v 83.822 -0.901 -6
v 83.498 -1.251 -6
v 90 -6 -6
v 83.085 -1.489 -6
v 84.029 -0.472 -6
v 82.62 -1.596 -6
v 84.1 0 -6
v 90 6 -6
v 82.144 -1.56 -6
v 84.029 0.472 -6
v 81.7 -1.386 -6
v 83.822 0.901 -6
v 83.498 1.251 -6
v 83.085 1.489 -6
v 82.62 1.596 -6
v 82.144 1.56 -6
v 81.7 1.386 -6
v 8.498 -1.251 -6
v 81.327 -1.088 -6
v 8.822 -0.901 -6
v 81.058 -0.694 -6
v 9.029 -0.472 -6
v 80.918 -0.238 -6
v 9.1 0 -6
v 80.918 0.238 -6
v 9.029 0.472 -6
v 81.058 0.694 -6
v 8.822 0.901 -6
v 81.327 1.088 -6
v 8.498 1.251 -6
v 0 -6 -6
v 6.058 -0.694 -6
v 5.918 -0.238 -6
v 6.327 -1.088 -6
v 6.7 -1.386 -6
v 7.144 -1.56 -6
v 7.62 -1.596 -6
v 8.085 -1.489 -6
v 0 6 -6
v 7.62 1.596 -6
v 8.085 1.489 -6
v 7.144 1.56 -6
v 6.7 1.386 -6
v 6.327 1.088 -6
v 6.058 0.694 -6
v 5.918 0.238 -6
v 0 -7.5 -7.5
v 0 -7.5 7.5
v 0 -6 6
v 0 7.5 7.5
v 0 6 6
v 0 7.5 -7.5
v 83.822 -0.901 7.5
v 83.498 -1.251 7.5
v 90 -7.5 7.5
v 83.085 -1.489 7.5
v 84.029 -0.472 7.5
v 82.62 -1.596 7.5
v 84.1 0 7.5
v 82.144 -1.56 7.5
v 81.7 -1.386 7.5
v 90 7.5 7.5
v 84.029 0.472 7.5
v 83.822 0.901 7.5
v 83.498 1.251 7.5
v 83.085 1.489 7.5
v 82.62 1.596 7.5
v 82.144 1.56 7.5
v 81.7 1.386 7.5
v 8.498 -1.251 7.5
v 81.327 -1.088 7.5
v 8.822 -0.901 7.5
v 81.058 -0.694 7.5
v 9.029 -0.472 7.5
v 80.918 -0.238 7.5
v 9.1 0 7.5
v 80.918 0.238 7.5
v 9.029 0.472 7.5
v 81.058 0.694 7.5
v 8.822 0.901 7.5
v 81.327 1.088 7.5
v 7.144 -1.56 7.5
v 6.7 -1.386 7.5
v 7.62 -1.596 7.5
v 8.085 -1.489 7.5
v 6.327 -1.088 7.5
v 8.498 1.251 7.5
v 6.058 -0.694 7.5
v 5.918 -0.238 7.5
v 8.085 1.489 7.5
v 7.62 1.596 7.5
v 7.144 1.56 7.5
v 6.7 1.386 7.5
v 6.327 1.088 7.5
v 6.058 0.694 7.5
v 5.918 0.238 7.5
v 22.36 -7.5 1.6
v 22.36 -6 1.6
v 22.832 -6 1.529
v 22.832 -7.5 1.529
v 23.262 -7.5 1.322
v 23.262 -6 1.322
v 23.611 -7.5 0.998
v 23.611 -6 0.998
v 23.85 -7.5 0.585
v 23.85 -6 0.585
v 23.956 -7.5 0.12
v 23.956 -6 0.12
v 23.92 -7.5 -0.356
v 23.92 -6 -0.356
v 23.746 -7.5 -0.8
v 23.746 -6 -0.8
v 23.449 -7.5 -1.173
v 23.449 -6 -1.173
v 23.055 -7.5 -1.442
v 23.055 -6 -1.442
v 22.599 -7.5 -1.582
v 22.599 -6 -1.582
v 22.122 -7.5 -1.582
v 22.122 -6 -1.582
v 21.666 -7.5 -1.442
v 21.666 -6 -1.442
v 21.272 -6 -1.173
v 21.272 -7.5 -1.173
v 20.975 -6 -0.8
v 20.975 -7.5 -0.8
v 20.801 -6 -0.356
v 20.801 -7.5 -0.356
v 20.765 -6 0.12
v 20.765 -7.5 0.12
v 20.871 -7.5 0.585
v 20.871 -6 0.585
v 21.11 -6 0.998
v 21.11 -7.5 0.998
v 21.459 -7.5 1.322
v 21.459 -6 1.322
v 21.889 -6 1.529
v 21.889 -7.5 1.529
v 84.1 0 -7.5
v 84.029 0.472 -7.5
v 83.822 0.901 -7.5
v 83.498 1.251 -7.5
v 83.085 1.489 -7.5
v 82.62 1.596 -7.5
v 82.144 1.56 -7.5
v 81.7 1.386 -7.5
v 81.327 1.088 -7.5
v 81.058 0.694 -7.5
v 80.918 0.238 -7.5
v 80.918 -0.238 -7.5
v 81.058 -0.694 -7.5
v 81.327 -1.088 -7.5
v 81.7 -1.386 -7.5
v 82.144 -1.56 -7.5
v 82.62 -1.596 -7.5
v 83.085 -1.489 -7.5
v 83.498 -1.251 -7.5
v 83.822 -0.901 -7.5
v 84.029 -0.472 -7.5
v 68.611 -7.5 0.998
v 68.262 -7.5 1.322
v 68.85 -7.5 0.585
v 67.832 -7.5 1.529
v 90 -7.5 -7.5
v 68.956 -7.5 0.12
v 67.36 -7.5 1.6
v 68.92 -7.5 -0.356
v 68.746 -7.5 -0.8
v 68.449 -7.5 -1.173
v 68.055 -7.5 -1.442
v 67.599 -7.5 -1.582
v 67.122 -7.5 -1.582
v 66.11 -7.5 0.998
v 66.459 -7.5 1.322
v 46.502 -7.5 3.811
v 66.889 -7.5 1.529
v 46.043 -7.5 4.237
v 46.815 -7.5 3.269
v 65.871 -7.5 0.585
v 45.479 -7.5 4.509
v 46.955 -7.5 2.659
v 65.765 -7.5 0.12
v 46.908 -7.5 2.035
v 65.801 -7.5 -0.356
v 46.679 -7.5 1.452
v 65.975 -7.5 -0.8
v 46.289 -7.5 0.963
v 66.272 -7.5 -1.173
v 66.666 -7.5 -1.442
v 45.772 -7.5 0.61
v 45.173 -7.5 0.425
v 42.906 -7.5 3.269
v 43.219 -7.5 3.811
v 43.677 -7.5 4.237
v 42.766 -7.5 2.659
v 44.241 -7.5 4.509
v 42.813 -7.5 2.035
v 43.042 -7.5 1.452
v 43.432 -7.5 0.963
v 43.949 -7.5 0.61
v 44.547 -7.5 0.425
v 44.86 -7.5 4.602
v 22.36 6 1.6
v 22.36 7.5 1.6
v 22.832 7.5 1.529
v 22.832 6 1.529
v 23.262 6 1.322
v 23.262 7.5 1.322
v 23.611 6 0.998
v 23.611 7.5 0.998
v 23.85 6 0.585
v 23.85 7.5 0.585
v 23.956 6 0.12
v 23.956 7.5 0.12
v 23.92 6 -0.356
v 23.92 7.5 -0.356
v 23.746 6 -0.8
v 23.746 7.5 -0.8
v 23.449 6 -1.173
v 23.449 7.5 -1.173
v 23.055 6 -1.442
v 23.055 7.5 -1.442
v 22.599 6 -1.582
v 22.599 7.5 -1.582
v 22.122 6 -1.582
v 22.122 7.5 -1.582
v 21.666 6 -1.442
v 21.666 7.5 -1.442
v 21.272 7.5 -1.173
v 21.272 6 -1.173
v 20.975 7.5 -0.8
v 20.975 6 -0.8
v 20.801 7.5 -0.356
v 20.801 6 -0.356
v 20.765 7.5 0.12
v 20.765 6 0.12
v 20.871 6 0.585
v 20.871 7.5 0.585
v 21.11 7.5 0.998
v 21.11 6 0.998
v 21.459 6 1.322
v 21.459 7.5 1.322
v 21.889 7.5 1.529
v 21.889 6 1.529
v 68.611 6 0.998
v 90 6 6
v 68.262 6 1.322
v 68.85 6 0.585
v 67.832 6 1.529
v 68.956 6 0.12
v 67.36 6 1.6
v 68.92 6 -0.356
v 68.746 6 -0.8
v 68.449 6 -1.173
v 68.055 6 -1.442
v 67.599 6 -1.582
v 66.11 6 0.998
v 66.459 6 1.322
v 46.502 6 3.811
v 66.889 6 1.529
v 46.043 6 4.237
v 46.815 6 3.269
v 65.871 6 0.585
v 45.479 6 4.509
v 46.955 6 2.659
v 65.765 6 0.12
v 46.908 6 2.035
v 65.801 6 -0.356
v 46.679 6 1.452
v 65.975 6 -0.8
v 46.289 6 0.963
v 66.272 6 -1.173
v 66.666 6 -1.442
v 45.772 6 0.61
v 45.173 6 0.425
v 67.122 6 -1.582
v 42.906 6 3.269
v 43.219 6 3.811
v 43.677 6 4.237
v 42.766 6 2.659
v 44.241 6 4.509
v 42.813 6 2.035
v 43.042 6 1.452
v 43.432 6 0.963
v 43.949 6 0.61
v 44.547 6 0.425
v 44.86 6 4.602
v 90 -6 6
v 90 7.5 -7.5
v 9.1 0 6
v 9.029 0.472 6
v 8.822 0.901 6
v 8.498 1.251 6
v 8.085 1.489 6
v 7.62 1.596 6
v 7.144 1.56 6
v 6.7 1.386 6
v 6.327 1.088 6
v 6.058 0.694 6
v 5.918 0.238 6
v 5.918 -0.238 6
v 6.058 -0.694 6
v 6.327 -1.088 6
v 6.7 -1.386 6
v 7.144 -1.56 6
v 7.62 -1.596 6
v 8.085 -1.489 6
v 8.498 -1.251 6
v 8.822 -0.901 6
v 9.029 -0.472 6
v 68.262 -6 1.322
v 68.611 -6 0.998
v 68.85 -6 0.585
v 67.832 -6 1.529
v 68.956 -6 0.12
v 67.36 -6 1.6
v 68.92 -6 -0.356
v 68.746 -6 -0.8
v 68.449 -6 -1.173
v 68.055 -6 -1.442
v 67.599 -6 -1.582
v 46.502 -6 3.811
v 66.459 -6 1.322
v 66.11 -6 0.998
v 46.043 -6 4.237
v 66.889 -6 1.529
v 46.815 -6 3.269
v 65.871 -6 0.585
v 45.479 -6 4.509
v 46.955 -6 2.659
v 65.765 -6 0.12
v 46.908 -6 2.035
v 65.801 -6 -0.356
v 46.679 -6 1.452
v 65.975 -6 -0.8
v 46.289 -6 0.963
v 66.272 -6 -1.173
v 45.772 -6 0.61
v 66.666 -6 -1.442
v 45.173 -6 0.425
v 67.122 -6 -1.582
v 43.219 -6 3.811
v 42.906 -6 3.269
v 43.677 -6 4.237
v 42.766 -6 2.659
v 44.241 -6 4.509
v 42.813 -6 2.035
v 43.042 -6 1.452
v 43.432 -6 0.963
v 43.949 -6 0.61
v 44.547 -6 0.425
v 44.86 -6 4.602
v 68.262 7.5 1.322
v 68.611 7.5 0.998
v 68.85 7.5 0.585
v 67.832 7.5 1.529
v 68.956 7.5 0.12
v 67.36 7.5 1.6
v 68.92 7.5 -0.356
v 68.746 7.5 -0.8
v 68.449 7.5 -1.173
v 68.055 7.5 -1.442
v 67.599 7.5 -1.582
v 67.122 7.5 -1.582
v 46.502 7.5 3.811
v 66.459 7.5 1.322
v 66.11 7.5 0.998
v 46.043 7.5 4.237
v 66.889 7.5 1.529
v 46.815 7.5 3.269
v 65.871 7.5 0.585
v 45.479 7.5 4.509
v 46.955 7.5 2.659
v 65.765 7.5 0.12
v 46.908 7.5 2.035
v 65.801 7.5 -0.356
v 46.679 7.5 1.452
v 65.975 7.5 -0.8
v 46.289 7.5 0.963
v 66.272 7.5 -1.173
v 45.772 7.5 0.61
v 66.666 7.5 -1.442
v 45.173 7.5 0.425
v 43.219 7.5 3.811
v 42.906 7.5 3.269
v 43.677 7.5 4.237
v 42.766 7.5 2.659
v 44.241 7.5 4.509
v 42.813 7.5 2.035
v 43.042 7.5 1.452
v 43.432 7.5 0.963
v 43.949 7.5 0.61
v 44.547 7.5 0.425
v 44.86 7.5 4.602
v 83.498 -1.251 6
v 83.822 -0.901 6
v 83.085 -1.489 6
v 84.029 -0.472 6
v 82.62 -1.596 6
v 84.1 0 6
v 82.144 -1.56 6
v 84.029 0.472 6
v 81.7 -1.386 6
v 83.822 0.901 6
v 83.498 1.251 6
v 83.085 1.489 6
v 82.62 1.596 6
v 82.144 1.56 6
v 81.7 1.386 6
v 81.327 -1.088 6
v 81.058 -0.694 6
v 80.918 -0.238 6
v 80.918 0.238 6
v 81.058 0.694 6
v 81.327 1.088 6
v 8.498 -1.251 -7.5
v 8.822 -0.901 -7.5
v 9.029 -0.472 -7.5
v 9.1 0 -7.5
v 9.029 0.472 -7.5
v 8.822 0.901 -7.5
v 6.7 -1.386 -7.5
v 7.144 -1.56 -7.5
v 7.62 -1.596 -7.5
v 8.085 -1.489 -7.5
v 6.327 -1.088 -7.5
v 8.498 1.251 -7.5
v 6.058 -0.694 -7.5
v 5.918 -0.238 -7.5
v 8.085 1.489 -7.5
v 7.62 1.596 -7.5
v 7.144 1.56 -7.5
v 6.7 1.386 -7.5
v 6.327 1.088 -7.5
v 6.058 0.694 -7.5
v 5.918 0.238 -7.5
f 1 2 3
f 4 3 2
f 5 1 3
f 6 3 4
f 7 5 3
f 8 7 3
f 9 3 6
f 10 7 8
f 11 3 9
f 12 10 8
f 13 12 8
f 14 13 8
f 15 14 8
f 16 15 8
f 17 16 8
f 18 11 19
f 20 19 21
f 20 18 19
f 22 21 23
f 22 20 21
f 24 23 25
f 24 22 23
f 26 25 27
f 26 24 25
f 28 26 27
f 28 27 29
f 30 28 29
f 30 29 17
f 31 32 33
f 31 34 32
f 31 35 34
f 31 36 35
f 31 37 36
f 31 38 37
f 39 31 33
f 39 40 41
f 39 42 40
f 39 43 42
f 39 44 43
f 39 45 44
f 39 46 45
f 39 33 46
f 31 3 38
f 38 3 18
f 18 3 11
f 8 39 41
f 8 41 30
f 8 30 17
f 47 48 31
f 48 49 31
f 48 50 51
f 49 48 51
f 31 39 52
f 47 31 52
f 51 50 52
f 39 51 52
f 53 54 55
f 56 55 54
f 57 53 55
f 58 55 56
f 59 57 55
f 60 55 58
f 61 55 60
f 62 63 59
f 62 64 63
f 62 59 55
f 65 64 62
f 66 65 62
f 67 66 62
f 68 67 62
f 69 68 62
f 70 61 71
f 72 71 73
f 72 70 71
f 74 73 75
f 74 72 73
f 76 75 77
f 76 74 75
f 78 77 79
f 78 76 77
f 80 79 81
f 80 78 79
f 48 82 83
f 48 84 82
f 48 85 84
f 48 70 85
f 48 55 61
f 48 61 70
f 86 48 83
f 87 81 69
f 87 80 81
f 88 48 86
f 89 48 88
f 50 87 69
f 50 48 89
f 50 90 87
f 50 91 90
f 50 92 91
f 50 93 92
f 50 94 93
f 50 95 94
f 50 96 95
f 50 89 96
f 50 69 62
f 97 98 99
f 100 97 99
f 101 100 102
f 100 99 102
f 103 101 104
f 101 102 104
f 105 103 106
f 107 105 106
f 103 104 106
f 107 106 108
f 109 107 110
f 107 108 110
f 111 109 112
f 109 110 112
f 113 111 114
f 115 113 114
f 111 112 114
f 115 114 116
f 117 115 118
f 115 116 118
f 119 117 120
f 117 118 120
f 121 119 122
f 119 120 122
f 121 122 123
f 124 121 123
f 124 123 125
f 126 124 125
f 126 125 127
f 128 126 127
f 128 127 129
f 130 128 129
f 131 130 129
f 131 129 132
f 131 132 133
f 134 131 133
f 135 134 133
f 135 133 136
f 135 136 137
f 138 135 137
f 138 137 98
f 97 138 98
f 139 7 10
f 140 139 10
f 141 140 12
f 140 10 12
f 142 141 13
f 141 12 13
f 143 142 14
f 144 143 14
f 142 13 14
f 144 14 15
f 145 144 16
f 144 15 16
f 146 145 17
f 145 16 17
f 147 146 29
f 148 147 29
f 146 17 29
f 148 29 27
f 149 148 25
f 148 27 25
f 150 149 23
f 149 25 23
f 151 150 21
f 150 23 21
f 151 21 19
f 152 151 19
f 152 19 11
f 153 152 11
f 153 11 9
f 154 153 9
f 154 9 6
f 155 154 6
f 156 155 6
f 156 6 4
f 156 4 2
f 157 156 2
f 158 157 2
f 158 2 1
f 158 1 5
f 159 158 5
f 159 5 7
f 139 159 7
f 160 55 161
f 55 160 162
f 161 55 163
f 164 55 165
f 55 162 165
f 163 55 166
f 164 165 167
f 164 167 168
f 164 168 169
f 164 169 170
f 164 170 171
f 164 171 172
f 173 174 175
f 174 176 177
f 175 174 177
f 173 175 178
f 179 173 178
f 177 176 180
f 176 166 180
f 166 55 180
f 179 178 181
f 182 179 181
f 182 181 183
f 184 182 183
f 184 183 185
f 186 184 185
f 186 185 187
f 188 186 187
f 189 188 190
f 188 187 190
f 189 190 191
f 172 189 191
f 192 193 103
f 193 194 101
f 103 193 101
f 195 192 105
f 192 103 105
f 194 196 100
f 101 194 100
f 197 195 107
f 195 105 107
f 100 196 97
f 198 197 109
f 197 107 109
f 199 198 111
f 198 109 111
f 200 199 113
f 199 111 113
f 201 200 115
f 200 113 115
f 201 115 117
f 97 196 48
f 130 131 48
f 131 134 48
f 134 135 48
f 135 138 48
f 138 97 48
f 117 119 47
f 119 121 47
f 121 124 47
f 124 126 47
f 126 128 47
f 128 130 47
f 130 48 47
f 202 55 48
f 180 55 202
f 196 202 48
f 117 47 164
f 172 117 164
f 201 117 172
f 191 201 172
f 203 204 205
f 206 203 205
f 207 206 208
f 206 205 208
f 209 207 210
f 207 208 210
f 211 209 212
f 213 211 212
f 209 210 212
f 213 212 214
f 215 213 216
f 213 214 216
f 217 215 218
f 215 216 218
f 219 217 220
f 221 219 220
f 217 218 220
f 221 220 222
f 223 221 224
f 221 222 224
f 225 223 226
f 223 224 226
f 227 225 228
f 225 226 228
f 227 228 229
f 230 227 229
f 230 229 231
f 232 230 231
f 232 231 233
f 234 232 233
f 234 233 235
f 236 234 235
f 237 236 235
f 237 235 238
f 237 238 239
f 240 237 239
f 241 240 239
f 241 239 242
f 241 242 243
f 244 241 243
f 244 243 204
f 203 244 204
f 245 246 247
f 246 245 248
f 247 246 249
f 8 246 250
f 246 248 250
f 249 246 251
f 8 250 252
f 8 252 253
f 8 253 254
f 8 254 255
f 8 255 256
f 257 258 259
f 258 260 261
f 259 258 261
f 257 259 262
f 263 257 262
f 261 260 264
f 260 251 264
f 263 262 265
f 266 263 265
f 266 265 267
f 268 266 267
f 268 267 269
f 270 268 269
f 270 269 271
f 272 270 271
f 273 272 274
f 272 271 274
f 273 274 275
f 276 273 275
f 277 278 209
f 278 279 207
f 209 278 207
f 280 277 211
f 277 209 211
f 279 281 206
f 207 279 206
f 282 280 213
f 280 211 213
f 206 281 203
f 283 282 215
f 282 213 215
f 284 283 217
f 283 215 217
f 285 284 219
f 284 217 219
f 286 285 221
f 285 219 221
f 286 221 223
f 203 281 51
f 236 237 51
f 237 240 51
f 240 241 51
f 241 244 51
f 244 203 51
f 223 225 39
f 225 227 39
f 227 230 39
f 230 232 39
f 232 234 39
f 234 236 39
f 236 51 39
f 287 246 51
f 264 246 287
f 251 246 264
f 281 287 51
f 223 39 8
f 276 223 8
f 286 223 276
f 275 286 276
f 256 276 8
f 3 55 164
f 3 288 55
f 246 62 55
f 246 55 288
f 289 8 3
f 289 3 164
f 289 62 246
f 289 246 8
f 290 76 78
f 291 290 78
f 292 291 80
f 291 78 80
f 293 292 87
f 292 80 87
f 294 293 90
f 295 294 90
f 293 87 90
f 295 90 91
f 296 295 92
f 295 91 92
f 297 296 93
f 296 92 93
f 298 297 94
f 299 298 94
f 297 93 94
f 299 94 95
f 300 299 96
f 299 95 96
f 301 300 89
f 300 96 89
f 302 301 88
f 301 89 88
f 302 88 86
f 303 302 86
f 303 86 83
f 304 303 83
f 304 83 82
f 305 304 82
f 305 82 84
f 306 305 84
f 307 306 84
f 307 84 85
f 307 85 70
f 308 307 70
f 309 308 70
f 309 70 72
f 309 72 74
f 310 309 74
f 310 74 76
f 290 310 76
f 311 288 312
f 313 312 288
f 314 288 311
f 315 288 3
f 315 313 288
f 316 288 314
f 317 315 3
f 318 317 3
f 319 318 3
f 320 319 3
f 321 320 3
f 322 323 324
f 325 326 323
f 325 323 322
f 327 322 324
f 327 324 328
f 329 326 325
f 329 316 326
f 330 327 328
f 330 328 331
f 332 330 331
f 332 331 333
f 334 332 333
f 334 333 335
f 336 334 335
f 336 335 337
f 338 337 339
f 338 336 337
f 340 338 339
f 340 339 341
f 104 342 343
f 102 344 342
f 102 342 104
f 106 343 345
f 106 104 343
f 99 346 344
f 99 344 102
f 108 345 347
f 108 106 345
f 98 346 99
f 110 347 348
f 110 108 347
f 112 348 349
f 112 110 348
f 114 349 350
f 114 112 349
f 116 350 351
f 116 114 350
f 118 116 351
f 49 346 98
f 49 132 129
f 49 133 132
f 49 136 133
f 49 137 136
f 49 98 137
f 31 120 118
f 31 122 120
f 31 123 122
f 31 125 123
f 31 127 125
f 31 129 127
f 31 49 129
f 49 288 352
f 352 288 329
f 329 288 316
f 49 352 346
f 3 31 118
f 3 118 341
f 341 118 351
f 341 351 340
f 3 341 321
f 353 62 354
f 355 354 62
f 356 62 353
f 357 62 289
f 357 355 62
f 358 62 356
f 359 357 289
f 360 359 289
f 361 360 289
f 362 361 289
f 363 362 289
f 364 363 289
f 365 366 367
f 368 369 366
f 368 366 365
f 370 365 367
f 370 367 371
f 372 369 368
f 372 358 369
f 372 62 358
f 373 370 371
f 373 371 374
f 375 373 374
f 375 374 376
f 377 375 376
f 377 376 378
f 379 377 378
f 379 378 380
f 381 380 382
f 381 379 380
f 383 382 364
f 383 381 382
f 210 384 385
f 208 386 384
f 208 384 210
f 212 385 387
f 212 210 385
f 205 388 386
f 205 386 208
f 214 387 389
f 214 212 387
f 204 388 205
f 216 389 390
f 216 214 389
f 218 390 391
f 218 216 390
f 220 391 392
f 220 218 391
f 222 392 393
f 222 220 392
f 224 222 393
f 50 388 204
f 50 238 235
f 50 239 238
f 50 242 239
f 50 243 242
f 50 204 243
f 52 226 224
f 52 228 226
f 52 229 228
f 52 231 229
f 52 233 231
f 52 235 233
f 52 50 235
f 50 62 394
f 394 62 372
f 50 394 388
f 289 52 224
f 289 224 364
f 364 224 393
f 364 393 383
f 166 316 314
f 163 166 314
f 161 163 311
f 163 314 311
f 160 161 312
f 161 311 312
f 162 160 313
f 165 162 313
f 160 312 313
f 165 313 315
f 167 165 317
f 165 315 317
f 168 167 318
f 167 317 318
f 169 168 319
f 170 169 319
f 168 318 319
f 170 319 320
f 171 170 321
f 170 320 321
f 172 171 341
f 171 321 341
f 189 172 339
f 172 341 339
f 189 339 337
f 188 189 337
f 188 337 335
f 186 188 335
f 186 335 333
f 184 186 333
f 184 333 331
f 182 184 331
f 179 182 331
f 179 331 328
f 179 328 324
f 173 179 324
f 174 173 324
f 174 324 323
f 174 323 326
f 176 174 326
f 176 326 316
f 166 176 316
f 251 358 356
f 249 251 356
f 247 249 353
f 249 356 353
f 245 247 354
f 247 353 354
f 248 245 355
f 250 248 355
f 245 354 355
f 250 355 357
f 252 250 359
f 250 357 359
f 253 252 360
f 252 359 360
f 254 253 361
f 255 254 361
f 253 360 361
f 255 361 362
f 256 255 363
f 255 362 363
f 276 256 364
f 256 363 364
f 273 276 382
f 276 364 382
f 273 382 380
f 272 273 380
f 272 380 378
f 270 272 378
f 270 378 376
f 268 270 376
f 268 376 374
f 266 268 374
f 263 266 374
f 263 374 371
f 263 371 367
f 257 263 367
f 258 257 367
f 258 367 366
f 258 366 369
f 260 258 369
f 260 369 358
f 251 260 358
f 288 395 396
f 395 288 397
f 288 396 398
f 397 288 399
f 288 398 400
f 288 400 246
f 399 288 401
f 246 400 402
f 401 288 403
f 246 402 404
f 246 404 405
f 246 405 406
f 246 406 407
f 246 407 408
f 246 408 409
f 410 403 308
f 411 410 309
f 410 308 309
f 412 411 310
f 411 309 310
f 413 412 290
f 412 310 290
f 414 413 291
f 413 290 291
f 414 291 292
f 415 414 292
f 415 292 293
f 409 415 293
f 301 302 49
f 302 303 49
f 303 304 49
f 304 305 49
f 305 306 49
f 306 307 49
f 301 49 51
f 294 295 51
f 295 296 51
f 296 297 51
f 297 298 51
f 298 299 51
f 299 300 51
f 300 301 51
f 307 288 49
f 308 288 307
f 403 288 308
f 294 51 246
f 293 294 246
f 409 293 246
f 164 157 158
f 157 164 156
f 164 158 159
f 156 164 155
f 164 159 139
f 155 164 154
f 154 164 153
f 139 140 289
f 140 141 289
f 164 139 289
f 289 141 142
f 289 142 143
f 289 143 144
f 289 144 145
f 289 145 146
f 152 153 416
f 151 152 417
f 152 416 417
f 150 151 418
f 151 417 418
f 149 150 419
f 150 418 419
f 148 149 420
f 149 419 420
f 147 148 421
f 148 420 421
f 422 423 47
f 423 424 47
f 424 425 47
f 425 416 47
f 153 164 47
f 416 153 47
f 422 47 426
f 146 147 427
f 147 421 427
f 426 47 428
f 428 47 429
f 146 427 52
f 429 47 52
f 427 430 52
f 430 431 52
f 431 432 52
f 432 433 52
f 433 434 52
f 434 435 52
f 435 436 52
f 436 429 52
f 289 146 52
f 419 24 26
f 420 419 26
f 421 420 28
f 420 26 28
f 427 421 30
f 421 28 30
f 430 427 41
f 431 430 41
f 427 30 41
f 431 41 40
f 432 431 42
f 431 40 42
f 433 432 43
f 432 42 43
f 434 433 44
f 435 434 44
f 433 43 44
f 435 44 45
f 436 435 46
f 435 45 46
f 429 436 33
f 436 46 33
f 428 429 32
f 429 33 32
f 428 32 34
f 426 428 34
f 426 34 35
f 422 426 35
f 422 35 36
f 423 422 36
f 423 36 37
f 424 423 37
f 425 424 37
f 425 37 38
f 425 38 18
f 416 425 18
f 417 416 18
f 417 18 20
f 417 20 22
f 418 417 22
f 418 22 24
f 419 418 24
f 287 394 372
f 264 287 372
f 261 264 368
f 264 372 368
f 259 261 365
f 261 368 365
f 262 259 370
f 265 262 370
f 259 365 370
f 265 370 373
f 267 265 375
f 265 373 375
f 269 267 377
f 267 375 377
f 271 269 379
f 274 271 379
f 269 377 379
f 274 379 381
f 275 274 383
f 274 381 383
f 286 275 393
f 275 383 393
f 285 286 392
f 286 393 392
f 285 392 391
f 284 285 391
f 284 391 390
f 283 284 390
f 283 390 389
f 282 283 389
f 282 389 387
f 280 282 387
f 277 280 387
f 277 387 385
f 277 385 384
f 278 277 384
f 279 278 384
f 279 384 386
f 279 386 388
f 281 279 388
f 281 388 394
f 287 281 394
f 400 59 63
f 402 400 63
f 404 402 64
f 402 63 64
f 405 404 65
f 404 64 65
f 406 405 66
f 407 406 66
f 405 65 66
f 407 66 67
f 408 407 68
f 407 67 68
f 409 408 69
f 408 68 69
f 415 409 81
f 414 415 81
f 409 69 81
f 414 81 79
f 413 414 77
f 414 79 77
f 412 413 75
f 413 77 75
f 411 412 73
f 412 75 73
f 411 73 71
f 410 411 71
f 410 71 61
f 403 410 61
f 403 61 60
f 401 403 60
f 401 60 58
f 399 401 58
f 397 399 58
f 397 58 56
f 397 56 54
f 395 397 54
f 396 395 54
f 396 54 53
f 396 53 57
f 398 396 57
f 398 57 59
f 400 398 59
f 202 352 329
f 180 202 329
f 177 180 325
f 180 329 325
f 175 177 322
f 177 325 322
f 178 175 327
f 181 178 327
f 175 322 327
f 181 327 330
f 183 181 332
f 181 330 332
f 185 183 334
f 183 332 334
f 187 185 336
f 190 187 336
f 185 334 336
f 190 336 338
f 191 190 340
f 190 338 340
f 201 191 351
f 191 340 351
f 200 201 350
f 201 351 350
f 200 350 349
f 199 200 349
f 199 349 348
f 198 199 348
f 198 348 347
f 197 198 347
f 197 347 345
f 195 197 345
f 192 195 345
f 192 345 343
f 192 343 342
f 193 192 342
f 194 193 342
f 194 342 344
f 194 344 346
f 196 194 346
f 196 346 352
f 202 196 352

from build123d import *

# Parameters (mm, degrees)
SKETCH_1_W          = 15
SKETCH_1_H          = 15
SKETCH_1_W_2        = 12
SKETCH_1_H_2        = 12
EXTRUDE_1_DEPTH     = 90
SKETCH_2_R          = 2.1
SKETCH_2_R_2        = 1.6
CUT_EXTRUDE_1_DEPTH = 92.549167118
SKETCH_3_R          = 1.6
CUT_EXTRUDE_2_DEPTH = 92.549167118


with BuildPart() as part:
    # ｽｹｯﾁ1 → ﾎﾞｽ - 押し出し1 (new body)
    with BuildSketch(Plane(origin=(0, 0, 0), x_dir=(0, 0, -1), z_dir=(1, 0, 0))):
        Rectangle(SKETCH_1_W, SKETCH_1_H)
        Rectangle(SKETCH_1_W_2, SKETCH_1_H_2, mode=Mode.SUBTRACT)
    extrude(amount=EXTRUDE_1_DEPTH)

    # ｽｹｯﾁ2 → ｶｯﾄ - 押し出し1 (cut, through all)
    with BuildSketch(Plane(origin=(0, 7.5, 0), x_dir=(1, 0, 0), z_dir=(0, 1, 0))):
        with Locations(Location((44.860461956, -2.501947466, 0), (0, 0, 270))):
            Circle(SKETCH_2_R)
        with Locations(Location((22.360461956, 0, 0), (0, 0, 270))):
            Circle(SKETCH_2_R_2)
        with Locations(Location((67.360461956, 0, 0), (0, 0, 270))):
            Circle(SKETCH_2_R_2)
    extrude(amount=-CUT_EXTRUDE_1_DEPTH, mode=Mode.SUBTRACT)

    # ｽｹｯﾁ3 → ｶｯﾄ - 押し出し2 (cut, through all)
    with BuildSketch(Plane.XY.offset(7.5)):
        with Locations((7.5, 0)):
            Circle(SKETCH_3_R)
        with Locations((82.5, 0)):
            Circle(SKETCH_3_R)
    extrude(amount=-CUT_EXTRUDE_2_DEPTH, mode=Mode.SUBTRACT)


solid = part.part
